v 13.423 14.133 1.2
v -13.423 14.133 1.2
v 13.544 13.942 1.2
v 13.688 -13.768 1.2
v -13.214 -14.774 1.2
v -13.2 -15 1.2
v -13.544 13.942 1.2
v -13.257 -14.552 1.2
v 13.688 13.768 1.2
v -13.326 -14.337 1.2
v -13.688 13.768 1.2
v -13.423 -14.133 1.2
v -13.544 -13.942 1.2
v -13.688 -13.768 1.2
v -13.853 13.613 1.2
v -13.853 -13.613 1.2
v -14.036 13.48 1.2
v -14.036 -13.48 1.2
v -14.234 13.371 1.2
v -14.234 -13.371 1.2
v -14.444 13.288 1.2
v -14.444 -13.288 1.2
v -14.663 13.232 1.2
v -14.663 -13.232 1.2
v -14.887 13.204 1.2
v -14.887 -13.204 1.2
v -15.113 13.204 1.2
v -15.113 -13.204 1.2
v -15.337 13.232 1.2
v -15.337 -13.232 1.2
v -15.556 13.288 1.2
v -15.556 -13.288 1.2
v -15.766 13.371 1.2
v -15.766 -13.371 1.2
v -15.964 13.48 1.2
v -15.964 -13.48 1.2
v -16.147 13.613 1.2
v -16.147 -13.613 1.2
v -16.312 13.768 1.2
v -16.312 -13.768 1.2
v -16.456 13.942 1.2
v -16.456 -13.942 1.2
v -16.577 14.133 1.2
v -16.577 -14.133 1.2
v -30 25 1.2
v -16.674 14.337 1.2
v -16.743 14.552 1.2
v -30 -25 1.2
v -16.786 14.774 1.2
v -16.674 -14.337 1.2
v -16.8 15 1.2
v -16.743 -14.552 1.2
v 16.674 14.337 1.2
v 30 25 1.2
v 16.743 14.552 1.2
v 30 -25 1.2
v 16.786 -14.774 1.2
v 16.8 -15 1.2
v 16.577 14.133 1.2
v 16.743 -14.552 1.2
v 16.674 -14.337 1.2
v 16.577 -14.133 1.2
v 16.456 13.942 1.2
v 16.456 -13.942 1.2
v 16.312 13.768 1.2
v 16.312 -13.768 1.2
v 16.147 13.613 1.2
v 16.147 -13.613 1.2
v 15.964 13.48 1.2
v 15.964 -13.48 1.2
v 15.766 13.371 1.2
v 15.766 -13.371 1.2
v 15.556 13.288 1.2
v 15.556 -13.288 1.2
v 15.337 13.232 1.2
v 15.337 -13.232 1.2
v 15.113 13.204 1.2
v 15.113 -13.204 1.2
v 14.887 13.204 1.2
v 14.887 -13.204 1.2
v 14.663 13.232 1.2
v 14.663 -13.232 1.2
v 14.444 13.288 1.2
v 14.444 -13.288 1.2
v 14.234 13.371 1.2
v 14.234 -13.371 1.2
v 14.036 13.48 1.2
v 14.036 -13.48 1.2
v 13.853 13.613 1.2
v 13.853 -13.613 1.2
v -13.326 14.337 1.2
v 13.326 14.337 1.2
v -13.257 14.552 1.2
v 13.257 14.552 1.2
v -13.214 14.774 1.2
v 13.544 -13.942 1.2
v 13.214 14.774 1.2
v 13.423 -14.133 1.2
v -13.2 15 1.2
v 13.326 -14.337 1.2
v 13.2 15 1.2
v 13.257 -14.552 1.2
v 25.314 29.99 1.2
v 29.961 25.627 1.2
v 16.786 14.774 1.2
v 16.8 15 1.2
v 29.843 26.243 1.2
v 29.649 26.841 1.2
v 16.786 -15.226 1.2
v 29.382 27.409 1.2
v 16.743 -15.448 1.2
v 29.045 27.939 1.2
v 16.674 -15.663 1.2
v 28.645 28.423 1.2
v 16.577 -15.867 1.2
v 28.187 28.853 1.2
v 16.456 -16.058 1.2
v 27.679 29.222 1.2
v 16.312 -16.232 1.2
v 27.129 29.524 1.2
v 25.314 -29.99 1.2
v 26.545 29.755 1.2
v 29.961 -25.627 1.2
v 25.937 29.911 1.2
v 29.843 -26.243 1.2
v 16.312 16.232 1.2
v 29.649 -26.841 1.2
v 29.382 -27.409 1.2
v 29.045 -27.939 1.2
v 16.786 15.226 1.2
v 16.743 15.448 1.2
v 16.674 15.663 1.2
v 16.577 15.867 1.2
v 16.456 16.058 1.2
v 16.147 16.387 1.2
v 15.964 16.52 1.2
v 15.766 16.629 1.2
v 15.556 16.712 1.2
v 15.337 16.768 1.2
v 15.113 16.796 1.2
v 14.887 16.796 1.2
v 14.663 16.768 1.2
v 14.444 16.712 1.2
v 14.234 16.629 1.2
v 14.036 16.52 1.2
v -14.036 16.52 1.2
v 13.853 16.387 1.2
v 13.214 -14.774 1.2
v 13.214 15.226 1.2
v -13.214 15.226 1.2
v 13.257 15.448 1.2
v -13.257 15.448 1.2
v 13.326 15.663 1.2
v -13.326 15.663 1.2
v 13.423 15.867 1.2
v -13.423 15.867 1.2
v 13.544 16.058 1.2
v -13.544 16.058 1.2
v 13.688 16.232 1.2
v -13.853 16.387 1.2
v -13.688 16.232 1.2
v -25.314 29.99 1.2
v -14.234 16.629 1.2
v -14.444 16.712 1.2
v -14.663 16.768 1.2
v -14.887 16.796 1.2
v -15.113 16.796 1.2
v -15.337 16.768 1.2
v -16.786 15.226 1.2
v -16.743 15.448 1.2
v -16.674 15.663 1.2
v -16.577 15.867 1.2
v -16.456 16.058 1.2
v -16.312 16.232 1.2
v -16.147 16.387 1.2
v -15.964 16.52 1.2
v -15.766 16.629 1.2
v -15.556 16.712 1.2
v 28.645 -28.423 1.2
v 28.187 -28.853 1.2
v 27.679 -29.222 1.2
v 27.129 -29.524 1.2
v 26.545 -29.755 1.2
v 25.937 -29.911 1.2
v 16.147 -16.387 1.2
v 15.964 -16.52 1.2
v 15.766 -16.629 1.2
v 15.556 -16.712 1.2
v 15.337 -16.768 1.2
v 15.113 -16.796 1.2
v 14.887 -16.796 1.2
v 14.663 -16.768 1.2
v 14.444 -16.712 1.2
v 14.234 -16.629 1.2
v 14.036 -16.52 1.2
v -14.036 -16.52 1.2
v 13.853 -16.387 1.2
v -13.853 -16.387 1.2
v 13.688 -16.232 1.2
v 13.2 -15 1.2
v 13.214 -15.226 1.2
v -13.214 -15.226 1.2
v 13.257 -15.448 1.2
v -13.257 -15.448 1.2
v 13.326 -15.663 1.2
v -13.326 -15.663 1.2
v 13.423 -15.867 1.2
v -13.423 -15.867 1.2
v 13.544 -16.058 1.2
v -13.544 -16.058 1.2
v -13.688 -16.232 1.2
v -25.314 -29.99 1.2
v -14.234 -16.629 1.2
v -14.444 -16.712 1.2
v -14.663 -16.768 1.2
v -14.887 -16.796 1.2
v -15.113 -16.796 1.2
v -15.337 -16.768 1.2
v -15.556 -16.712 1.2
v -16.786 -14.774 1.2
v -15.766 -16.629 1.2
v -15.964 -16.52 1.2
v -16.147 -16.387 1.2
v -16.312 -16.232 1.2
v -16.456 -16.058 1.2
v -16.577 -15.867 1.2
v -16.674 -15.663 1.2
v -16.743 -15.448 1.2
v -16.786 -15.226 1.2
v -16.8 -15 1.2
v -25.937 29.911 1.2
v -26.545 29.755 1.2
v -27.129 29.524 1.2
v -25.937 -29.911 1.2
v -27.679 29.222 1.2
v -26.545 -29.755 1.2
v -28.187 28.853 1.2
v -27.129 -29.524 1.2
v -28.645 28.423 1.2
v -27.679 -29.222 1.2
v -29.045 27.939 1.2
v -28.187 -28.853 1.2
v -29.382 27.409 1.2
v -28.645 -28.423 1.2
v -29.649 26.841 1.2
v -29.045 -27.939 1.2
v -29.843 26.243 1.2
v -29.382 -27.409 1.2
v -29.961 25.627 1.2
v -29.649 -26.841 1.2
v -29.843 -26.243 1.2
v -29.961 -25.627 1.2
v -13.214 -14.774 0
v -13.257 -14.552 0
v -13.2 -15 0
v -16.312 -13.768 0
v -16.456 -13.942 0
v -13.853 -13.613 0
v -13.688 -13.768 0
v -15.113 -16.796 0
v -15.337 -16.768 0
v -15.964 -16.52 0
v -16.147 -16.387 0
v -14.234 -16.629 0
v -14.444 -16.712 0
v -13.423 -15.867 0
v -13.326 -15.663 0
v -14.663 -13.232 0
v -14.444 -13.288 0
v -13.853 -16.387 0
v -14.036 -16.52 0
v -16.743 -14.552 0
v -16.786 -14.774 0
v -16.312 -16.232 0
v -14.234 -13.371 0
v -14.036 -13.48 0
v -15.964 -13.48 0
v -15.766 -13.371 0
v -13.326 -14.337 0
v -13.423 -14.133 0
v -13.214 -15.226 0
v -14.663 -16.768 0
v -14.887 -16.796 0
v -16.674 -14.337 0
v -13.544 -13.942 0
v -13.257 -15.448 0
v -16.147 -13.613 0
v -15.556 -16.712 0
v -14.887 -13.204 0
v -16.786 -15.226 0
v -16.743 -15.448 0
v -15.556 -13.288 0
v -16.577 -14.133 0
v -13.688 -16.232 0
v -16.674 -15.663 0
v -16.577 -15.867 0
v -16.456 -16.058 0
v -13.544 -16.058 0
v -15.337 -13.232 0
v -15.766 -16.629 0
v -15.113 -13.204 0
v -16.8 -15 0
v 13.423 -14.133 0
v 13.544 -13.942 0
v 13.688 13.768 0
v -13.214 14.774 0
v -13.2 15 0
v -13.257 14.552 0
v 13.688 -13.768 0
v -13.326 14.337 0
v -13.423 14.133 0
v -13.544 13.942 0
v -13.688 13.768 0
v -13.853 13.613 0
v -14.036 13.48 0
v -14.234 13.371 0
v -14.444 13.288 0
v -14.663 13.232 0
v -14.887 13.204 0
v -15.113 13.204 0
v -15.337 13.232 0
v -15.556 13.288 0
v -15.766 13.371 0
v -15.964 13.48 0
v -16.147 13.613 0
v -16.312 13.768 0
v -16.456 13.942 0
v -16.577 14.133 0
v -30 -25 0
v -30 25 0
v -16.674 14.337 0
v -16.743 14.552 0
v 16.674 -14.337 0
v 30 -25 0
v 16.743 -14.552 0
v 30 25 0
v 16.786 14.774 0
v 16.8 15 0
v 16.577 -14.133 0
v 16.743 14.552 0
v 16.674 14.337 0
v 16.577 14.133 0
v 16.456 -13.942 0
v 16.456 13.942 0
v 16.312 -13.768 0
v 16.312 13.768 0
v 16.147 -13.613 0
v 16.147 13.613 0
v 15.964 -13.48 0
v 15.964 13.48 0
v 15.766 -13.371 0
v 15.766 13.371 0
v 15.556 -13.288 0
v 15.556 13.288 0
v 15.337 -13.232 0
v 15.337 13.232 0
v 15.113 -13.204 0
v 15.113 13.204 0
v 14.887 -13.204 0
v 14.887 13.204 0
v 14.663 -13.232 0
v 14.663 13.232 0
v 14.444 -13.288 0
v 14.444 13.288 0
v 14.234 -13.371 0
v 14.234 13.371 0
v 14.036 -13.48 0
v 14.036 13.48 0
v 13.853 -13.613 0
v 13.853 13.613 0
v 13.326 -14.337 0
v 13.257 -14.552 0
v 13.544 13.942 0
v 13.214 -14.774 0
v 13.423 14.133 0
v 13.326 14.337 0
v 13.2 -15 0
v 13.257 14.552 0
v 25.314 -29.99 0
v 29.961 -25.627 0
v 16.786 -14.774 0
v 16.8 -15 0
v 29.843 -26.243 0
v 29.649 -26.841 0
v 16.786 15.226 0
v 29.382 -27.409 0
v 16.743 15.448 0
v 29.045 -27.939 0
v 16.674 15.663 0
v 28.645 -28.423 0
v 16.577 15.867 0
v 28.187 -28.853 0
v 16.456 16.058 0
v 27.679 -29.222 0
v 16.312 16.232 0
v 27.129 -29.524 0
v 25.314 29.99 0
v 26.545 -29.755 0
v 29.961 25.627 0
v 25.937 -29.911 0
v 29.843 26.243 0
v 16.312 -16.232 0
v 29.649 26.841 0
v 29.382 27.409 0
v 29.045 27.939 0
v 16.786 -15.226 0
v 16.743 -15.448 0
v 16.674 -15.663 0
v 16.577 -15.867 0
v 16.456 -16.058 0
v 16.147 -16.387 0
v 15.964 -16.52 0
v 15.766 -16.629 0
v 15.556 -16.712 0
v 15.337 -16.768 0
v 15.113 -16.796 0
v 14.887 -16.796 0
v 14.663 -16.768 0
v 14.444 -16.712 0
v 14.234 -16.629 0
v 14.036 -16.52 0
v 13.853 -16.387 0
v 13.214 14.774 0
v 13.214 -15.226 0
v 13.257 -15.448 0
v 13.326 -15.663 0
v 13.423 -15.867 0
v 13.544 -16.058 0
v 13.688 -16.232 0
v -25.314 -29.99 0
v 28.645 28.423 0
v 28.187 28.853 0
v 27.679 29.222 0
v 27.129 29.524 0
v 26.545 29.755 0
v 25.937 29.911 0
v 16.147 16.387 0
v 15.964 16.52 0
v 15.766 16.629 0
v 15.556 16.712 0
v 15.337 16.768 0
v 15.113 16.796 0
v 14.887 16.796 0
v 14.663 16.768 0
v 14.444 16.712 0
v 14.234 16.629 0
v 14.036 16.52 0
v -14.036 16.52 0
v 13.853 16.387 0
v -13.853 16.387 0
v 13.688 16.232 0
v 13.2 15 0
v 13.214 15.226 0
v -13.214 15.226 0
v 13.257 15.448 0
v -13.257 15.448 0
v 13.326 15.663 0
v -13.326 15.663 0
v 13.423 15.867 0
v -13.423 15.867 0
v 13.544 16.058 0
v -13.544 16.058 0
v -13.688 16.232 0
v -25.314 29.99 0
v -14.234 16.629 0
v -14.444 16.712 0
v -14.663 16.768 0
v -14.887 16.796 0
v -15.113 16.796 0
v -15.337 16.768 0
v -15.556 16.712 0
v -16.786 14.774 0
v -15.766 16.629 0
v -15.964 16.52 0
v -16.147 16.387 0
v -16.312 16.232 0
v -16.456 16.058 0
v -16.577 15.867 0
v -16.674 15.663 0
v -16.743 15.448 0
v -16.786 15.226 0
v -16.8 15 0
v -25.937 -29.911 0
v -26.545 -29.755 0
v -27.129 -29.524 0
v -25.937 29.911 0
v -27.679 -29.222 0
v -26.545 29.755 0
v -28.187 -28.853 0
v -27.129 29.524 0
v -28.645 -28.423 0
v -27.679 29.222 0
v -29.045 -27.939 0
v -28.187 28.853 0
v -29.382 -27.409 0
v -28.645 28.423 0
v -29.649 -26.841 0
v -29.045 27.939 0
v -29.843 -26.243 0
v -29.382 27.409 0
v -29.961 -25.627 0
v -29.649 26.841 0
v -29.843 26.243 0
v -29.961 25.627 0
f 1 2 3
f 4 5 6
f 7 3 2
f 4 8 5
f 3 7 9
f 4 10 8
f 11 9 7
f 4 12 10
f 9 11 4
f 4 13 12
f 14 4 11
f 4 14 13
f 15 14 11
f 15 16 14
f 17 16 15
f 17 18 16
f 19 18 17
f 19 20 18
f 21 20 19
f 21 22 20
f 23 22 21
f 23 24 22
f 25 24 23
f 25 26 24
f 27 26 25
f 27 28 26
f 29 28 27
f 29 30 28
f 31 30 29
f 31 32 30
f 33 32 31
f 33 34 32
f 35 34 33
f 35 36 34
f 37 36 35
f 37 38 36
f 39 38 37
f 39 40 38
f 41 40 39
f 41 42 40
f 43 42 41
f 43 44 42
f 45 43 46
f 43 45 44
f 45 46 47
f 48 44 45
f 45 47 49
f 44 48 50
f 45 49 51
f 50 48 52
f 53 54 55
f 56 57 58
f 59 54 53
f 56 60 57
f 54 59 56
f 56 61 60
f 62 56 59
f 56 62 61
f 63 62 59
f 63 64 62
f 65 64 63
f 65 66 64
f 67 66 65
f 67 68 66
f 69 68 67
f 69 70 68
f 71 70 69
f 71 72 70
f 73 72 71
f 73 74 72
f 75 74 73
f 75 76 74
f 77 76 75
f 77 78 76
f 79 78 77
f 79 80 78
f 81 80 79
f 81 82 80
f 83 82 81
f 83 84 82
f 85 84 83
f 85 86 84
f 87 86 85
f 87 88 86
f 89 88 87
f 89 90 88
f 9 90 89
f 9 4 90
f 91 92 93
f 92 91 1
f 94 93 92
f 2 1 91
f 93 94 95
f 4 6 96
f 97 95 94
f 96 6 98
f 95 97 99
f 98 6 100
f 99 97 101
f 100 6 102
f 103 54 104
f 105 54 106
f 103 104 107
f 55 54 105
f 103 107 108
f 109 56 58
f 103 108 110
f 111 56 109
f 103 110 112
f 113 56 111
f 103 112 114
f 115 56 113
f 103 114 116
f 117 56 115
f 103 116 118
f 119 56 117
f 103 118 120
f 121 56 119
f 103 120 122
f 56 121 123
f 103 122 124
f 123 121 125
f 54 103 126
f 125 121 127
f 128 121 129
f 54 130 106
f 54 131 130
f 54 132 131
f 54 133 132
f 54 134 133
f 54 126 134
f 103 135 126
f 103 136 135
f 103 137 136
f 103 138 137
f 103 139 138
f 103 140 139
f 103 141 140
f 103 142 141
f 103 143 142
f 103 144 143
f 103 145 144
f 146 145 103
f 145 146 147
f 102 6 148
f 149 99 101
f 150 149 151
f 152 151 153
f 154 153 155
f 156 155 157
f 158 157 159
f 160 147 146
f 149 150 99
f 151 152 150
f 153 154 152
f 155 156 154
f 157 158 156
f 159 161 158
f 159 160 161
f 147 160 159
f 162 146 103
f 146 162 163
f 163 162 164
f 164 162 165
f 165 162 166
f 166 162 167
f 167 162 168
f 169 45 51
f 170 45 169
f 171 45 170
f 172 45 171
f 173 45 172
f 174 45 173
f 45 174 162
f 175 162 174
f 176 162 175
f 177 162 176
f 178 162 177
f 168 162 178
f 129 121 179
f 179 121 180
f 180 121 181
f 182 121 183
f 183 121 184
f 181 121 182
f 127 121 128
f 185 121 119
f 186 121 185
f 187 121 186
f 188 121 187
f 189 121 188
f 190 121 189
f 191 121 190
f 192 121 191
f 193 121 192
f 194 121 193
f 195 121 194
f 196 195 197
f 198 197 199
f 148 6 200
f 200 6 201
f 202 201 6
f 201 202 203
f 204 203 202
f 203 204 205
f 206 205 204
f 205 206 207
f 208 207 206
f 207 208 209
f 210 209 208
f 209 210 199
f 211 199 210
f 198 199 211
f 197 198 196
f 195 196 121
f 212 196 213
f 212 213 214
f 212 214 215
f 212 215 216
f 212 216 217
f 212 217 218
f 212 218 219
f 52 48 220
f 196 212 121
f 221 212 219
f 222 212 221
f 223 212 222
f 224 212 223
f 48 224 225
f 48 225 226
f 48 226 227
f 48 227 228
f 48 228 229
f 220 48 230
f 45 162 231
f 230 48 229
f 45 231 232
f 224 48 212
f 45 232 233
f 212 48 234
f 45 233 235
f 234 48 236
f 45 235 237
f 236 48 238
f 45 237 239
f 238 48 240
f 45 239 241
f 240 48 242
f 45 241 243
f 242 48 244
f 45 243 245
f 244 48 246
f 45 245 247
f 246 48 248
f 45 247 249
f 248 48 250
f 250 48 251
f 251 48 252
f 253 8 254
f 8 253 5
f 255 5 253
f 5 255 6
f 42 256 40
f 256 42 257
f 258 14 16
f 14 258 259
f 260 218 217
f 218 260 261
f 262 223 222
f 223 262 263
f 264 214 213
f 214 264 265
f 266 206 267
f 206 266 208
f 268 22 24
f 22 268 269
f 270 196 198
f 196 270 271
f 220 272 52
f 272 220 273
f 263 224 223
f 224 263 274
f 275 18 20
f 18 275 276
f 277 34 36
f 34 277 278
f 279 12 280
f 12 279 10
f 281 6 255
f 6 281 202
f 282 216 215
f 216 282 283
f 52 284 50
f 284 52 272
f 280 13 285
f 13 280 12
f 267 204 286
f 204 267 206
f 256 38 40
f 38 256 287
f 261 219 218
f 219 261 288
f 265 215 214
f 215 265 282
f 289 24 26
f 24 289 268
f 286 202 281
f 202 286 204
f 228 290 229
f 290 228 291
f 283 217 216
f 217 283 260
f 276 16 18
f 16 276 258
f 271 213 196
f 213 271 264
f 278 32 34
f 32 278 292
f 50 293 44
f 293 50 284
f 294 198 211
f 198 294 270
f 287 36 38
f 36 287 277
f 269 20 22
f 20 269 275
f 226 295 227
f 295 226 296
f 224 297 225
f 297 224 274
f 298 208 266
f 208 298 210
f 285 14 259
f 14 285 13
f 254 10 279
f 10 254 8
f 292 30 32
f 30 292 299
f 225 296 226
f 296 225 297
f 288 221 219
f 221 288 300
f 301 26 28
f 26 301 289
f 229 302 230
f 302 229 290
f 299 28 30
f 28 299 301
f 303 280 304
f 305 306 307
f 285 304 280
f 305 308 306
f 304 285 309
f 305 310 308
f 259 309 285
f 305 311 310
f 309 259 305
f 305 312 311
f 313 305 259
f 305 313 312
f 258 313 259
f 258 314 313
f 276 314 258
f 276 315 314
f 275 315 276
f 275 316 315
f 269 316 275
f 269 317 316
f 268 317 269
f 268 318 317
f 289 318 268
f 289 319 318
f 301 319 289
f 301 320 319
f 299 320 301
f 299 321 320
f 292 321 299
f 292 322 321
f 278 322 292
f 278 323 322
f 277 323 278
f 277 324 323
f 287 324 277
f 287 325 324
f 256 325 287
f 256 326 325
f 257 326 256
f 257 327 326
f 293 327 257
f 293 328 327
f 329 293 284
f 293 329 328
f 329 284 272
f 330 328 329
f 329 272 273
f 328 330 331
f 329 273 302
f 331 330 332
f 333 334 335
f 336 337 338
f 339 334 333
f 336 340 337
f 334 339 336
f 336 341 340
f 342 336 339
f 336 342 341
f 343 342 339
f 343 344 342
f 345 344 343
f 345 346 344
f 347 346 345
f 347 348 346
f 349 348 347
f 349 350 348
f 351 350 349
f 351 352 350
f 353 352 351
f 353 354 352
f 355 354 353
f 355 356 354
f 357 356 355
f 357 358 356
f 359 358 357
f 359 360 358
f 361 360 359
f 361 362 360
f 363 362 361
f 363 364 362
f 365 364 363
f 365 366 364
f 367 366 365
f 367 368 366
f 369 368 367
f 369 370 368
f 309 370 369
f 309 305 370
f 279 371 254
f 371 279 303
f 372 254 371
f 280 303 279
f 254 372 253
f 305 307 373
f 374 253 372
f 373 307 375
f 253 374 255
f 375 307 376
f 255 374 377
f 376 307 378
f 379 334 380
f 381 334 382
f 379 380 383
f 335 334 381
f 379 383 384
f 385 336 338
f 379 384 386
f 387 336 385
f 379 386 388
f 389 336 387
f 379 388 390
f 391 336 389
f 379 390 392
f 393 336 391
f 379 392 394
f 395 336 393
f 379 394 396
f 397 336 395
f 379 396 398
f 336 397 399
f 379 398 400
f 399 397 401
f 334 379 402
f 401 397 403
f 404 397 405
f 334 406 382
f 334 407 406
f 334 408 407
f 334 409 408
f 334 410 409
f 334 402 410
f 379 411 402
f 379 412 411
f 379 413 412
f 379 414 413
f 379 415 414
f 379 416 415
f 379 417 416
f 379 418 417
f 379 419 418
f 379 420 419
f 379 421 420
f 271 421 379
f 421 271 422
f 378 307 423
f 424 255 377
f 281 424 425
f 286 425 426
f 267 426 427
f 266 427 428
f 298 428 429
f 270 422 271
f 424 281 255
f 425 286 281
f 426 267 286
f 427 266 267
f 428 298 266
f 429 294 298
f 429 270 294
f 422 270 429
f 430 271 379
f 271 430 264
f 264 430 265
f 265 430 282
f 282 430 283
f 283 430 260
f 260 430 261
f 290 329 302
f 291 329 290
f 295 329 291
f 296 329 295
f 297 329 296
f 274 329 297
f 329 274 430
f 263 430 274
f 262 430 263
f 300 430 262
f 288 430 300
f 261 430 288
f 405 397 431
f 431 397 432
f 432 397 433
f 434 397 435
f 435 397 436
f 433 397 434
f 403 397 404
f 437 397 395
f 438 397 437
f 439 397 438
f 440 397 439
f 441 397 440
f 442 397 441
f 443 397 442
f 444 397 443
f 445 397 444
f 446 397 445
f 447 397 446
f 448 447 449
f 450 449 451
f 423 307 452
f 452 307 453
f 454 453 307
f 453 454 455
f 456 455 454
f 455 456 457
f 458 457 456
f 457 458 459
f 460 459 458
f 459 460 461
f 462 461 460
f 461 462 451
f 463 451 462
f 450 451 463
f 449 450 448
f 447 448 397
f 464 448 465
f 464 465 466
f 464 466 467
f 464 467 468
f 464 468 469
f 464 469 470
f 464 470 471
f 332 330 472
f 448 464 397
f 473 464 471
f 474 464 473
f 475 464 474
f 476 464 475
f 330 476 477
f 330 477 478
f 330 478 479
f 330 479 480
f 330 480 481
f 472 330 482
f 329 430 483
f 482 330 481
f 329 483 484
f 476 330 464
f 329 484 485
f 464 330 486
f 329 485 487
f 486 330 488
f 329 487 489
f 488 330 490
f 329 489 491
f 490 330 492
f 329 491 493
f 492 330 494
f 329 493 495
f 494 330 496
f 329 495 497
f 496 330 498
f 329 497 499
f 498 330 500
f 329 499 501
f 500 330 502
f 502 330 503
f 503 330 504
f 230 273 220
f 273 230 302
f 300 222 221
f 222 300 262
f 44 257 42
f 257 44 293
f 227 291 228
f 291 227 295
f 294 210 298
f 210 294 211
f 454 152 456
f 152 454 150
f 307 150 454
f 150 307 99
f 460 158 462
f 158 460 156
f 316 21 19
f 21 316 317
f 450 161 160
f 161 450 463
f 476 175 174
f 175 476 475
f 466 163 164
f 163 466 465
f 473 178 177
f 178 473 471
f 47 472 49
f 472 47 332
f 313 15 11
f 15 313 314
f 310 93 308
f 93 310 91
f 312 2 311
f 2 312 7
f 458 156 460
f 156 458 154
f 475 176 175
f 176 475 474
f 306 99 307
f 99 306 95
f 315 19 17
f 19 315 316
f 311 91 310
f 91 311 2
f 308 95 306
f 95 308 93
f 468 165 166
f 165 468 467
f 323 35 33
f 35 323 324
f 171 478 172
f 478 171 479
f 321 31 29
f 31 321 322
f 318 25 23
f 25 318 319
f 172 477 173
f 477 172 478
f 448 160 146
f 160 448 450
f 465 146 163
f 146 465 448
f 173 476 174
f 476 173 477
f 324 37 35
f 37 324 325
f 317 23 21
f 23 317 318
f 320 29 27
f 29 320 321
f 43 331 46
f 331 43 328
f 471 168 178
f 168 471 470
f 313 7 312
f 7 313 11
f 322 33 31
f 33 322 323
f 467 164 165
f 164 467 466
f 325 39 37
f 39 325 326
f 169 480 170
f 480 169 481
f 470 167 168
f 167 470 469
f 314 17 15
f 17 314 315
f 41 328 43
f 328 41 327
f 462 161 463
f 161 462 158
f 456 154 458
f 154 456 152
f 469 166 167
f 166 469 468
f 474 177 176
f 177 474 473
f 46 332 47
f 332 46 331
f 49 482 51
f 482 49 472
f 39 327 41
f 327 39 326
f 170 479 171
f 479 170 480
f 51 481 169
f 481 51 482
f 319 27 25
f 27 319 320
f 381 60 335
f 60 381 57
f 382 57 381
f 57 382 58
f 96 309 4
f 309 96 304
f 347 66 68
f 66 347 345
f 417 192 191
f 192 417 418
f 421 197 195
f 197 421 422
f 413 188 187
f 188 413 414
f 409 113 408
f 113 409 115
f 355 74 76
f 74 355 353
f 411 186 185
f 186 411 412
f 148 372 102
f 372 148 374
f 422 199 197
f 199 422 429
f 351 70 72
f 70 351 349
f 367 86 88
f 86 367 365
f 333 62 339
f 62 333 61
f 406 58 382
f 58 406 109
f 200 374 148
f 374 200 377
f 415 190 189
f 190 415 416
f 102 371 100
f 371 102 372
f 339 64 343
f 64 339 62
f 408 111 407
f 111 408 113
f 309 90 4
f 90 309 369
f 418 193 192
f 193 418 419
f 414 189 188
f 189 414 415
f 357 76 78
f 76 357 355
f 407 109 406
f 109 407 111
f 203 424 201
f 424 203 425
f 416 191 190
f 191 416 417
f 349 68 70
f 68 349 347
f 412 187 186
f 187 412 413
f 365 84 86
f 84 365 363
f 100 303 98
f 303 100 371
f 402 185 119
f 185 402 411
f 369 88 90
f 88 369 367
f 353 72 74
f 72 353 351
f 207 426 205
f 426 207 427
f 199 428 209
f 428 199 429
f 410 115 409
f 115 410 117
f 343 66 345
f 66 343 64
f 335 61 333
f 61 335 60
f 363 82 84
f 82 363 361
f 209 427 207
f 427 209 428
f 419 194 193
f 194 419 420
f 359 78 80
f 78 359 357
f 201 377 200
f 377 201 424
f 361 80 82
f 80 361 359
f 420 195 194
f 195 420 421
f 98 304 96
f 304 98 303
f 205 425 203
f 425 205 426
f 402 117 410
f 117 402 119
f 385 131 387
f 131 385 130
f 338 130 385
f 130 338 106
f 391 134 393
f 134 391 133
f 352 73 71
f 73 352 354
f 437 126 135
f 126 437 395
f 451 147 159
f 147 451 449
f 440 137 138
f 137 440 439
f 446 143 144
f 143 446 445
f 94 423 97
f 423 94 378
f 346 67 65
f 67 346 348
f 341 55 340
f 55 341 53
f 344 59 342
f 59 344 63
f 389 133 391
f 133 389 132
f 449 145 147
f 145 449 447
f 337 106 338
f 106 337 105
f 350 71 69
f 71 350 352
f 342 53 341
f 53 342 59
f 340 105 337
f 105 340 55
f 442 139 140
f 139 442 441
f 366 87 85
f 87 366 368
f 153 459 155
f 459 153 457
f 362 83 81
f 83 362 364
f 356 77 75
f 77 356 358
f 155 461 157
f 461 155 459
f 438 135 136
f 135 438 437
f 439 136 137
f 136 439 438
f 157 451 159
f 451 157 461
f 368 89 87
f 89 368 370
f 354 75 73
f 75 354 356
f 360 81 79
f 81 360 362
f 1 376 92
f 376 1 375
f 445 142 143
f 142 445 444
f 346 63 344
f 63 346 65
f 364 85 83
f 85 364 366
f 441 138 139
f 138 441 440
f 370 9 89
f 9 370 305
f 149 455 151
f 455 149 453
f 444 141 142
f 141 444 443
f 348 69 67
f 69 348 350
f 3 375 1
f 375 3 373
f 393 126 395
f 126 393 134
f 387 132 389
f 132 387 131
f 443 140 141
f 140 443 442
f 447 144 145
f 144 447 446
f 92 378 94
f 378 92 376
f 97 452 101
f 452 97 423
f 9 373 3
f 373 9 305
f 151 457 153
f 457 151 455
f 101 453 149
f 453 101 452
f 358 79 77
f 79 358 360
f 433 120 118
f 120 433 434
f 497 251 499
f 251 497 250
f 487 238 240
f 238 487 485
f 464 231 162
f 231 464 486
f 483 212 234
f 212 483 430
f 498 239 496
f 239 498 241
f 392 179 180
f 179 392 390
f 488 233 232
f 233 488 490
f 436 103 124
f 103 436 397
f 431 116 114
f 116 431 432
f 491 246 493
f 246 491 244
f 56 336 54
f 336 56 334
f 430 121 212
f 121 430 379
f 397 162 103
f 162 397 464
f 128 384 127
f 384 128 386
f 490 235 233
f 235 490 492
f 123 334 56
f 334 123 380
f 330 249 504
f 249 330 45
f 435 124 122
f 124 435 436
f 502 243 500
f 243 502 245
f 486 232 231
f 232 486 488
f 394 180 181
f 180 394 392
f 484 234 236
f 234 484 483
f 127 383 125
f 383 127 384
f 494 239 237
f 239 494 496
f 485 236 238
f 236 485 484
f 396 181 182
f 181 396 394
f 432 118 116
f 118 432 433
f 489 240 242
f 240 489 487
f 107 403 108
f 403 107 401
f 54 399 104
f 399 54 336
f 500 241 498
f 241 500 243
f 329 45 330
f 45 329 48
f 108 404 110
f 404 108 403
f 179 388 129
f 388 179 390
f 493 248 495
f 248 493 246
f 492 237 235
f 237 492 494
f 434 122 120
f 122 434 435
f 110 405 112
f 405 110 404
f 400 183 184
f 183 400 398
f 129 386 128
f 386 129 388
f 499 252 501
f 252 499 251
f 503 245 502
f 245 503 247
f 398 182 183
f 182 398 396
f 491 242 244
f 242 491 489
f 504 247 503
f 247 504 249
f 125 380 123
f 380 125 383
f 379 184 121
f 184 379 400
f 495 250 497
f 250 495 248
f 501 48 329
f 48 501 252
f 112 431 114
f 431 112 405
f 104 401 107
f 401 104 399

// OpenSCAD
$fn = 50;


difference() {
	union() {
		hull() {
			translate(v = [-25.0000000000, 25.0000000000, 0]) {
				cylinder(h = 21, r = 5);
			}
			translate(v = [25.0000000000, 25.0000000000, 0]) {
				cylinder(h = 21, r = 5);
			}
			translate(v = [-25.0000000000, -25.0000000000, 0]) {
				cylinder(h = 21, r = 5);
			}
			translate(v = [25.0000000000, -25.0000000000, 0]) {
				cylinder(h = 21, r = 5);
			}
		}
	}
	union() {
		translate(v = [0, 0, 1.2000000000]) {
			hull() {
				translate(v = [-25.0000000000, 25.0000000000, 0]) {
					cylinder(h = 19.8000000000, r = 3.8000000000);
				}
				translate(v = [25.0000000000, 25.0000000000, 0]) {
					cylinder(h = 19.8000000000, r = 3.8000000000);
				}
				translate(v = [-25.0000000000, -25.0000000000, 0]) {
					cylinder(h = 19.8000000000, r = 3.8000000000);
				}
				translate(v = [25.0000000000, -25.0000000000, 0]) {
					cylinder(h = 19.8000000000, r = 3.8000000000);
				}
			}
		}
		#translate(v = [-15.0000000000, -15.0000000000, 0]) {
			cylinder(h = 1.2000000000, r = 1.8000000000);
		}
		#translate(v = [-15.0000000000, 15.0000000000, 0]) {
			cylinder(h = 1.2000000000, r = 1.8000000000);
		}
		#translate(v = [15.0000000000, -15.0000000000, 0]) {
			cylinder(h = 1.2000000000, r = 1.8000000000);
		}
		#translate(v = [15.0000000000, 15.0000000000, 0]) {
			cylinder(h = 1.2000000000, r = 1.8000000000);
		}
		translate(v = [-250.0000000000, -250.0000000000, 1.2000000000]) {
			cube(size = [500, 500, 500]);
		}
		translate(v = [-250.0000000000, -250.0000000000, 1.2000000000]) {
			cube(size = [500, 500, 500]);
		}
		translate(v = [-250.0000000000, -250.0000000000, 1.2000000000]) {
			cube(size = [500, 500, 500]);
		}
	}
}
